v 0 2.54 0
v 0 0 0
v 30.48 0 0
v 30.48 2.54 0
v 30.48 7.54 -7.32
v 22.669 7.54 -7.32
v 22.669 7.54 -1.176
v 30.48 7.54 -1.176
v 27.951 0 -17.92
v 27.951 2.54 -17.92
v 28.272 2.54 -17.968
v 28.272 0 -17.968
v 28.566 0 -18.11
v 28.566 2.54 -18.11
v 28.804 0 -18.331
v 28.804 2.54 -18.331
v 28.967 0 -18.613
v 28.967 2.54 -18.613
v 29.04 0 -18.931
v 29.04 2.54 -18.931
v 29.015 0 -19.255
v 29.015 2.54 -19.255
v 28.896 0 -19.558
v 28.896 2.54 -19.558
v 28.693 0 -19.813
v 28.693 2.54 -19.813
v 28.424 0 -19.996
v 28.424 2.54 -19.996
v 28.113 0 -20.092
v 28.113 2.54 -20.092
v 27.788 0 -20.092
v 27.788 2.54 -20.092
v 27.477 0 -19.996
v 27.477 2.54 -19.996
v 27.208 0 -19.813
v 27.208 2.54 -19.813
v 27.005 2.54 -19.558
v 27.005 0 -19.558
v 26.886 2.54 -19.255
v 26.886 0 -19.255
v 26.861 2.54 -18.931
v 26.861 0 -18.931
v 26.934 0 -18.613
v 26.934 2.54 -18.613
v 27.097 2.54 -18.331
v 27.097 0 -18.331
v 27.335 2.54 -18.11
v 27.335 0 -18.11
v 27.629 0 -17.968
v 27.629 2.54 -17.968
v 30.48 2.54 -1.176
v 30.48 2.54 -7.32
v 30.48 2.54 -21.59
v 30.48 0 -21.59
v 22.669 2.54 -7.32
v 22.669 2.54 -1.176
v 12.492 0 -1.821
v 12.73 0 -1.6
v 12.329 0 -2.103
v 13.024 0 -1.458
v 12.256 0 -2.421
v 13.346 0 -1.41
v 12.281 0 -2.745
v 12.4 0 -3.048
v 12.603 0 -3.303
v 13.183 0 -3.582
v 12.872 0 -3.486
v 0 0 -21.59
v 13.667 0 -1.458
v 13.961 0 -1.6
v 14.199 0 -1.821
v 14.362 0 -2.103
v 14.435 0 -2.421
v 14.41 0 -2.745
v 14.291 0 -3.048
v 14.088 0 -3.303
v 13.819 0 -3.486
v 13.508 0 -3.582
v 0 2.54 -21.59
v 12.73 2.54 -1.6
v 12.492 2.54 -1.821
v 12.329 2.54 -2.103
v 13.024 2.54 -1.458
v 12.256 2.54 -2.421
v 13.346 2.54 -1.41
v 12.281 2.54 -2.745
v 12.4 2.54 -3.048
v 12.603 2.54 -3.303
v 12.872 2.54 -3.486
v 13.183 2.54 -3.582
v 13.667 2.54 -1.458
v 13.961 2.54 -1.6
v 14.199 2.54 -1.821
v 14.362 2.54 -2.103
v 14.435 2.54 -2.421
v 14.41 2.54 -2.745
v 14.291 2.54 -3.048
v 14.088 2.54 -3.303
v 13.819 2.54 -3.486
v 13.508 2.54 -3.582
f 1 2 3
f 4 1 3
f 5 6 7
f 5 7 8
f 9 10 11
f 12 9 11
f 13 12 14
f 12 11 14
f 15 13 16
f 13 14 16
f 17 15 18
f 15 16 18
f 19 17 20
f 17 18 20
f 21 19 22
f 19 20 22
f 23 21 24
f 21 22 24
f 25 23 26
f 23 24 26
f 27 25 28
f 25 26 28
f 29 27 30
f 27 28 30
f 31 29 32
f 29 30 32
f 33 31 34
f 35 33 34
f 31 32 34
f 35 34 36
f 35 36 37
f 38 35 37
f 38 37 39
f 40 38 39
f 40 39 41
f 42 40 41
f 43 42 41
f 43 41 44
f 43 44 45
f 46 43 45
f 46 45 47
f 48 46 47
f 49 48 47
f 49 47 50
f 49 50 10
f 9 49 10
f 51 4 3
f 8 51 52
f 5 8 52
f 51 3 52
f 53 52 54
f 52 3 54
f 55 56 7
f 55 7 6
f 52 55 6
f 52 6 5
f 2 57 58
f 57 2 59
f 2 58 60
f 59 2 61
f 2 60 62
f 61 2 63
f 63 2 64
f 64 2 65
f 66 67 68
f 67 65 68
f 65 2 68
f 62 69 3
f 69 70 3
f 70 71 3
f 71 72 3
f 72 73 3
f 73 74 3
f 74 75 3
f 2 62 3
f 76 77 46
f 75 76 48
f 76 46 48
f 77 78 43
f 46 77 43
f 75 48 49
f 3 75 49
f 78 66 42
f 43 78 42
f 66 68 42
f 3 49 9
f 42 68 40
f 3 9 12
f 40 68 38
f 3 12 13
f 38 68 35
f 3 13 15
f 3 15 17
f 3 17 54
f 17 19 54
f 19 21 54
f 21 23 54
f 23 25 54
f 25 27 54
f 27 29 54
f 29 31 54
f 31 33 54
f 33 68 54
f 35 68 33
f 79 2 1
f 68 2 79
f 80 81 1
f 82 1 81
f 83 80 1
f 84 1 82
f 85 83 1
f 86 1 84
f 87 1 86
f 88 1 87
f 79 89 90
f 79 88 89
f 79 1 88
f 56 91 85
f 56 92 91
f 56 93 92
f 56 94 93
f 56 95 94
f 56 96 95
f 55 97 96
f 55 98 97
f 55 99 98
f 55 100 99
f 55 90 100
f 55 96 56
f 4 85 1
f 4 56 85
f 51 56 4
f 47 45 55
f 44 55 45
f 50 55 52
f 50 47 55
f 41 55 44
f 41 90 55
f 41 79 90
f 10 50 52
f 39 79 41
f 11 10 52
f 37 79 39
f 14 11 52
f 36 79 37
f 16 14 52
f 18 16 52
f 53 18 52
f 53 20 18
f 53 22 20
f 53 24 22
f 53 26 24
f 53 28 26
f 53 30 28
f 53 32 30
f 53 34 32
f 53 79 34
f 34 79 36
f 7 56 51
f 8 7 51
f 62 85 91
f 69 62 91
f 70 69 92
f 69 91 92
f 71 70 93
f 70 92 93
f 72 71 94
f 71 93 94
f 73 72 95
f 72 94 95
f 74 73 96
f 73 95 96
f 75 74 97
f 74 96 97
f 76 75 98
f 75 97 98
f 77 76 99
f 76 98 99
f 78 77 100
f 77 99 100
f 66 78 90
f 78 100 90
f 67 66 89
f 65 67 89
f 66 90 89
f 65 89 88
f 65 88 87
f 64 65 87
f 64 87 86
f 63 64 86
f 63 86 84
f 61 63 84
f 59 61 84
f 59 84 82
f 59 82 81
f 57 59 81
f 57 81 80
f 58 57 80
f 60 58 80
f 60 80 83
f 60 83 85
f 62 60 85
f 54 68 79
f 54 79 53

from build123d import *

# Parameters (mm, degrees)
SKETCH1_W           = 30.48
SKETCH1_H           = 21.59
BOSS_EXTRUDE1_DEPTH = 2.54
SKETCH2_R           = 1.0922
CUT_EXTRUDE1_DEPTH  = 38.438083551
SKETCH4_W           = 7.811008033
SKETCH4_H           = 6.144185349
BOSS_EXTRUDE2_DEPTH = 5


with BuildPart() as part:
    # Sketch1 → Boss-Extrude1 (new body)
    with BuildSketch(Plane(origin=(0, 0, 0), x_dir=(1, 0, 0), z_dir=(0, 1, 0))):
        with Locations((15.24, 10.795)):
            Rectangle(SKETCH1_W, SKETCH1_H)
    extrude(amount=BOSS_EXTRUDE1_DEPTH)

    # Sketch2 → Cut-Extrude1 (cut, through all)
    with BuildSketch(Plane(origin=(0, 2.54, 0), x_dir=(1, 0, 0), z_dir=(0, 1, 0))):
        with Locations(Location((27.950511617, 19.012165286, 0), (0, 0, 270))):
            Circle(SKETCH2_R)
        with Locations(Location((13.345511617, 2.502165286, 0), (0, 0, 270))):
            Circle(SKETCH2_R)
    extrude(amount=-CUT_EXTRUDE1_DEPTH, mode=Mode.SUBTRACT)

    # Sketch4 → Boss-Extrude2 (add)
    with BuildSketch(Plane(origin=(0, 2.54, 0), x_dir=(1, 0, 0), z_dir=(0, 1, 0))):
        with Locations((26.574495984, 4.247718085)):
            Rectangle(SKETCH4_W, SKETCH4_H)
    extrude(amount=BOSS_EXTRUDE2_DEPTH)


solid = part.part
